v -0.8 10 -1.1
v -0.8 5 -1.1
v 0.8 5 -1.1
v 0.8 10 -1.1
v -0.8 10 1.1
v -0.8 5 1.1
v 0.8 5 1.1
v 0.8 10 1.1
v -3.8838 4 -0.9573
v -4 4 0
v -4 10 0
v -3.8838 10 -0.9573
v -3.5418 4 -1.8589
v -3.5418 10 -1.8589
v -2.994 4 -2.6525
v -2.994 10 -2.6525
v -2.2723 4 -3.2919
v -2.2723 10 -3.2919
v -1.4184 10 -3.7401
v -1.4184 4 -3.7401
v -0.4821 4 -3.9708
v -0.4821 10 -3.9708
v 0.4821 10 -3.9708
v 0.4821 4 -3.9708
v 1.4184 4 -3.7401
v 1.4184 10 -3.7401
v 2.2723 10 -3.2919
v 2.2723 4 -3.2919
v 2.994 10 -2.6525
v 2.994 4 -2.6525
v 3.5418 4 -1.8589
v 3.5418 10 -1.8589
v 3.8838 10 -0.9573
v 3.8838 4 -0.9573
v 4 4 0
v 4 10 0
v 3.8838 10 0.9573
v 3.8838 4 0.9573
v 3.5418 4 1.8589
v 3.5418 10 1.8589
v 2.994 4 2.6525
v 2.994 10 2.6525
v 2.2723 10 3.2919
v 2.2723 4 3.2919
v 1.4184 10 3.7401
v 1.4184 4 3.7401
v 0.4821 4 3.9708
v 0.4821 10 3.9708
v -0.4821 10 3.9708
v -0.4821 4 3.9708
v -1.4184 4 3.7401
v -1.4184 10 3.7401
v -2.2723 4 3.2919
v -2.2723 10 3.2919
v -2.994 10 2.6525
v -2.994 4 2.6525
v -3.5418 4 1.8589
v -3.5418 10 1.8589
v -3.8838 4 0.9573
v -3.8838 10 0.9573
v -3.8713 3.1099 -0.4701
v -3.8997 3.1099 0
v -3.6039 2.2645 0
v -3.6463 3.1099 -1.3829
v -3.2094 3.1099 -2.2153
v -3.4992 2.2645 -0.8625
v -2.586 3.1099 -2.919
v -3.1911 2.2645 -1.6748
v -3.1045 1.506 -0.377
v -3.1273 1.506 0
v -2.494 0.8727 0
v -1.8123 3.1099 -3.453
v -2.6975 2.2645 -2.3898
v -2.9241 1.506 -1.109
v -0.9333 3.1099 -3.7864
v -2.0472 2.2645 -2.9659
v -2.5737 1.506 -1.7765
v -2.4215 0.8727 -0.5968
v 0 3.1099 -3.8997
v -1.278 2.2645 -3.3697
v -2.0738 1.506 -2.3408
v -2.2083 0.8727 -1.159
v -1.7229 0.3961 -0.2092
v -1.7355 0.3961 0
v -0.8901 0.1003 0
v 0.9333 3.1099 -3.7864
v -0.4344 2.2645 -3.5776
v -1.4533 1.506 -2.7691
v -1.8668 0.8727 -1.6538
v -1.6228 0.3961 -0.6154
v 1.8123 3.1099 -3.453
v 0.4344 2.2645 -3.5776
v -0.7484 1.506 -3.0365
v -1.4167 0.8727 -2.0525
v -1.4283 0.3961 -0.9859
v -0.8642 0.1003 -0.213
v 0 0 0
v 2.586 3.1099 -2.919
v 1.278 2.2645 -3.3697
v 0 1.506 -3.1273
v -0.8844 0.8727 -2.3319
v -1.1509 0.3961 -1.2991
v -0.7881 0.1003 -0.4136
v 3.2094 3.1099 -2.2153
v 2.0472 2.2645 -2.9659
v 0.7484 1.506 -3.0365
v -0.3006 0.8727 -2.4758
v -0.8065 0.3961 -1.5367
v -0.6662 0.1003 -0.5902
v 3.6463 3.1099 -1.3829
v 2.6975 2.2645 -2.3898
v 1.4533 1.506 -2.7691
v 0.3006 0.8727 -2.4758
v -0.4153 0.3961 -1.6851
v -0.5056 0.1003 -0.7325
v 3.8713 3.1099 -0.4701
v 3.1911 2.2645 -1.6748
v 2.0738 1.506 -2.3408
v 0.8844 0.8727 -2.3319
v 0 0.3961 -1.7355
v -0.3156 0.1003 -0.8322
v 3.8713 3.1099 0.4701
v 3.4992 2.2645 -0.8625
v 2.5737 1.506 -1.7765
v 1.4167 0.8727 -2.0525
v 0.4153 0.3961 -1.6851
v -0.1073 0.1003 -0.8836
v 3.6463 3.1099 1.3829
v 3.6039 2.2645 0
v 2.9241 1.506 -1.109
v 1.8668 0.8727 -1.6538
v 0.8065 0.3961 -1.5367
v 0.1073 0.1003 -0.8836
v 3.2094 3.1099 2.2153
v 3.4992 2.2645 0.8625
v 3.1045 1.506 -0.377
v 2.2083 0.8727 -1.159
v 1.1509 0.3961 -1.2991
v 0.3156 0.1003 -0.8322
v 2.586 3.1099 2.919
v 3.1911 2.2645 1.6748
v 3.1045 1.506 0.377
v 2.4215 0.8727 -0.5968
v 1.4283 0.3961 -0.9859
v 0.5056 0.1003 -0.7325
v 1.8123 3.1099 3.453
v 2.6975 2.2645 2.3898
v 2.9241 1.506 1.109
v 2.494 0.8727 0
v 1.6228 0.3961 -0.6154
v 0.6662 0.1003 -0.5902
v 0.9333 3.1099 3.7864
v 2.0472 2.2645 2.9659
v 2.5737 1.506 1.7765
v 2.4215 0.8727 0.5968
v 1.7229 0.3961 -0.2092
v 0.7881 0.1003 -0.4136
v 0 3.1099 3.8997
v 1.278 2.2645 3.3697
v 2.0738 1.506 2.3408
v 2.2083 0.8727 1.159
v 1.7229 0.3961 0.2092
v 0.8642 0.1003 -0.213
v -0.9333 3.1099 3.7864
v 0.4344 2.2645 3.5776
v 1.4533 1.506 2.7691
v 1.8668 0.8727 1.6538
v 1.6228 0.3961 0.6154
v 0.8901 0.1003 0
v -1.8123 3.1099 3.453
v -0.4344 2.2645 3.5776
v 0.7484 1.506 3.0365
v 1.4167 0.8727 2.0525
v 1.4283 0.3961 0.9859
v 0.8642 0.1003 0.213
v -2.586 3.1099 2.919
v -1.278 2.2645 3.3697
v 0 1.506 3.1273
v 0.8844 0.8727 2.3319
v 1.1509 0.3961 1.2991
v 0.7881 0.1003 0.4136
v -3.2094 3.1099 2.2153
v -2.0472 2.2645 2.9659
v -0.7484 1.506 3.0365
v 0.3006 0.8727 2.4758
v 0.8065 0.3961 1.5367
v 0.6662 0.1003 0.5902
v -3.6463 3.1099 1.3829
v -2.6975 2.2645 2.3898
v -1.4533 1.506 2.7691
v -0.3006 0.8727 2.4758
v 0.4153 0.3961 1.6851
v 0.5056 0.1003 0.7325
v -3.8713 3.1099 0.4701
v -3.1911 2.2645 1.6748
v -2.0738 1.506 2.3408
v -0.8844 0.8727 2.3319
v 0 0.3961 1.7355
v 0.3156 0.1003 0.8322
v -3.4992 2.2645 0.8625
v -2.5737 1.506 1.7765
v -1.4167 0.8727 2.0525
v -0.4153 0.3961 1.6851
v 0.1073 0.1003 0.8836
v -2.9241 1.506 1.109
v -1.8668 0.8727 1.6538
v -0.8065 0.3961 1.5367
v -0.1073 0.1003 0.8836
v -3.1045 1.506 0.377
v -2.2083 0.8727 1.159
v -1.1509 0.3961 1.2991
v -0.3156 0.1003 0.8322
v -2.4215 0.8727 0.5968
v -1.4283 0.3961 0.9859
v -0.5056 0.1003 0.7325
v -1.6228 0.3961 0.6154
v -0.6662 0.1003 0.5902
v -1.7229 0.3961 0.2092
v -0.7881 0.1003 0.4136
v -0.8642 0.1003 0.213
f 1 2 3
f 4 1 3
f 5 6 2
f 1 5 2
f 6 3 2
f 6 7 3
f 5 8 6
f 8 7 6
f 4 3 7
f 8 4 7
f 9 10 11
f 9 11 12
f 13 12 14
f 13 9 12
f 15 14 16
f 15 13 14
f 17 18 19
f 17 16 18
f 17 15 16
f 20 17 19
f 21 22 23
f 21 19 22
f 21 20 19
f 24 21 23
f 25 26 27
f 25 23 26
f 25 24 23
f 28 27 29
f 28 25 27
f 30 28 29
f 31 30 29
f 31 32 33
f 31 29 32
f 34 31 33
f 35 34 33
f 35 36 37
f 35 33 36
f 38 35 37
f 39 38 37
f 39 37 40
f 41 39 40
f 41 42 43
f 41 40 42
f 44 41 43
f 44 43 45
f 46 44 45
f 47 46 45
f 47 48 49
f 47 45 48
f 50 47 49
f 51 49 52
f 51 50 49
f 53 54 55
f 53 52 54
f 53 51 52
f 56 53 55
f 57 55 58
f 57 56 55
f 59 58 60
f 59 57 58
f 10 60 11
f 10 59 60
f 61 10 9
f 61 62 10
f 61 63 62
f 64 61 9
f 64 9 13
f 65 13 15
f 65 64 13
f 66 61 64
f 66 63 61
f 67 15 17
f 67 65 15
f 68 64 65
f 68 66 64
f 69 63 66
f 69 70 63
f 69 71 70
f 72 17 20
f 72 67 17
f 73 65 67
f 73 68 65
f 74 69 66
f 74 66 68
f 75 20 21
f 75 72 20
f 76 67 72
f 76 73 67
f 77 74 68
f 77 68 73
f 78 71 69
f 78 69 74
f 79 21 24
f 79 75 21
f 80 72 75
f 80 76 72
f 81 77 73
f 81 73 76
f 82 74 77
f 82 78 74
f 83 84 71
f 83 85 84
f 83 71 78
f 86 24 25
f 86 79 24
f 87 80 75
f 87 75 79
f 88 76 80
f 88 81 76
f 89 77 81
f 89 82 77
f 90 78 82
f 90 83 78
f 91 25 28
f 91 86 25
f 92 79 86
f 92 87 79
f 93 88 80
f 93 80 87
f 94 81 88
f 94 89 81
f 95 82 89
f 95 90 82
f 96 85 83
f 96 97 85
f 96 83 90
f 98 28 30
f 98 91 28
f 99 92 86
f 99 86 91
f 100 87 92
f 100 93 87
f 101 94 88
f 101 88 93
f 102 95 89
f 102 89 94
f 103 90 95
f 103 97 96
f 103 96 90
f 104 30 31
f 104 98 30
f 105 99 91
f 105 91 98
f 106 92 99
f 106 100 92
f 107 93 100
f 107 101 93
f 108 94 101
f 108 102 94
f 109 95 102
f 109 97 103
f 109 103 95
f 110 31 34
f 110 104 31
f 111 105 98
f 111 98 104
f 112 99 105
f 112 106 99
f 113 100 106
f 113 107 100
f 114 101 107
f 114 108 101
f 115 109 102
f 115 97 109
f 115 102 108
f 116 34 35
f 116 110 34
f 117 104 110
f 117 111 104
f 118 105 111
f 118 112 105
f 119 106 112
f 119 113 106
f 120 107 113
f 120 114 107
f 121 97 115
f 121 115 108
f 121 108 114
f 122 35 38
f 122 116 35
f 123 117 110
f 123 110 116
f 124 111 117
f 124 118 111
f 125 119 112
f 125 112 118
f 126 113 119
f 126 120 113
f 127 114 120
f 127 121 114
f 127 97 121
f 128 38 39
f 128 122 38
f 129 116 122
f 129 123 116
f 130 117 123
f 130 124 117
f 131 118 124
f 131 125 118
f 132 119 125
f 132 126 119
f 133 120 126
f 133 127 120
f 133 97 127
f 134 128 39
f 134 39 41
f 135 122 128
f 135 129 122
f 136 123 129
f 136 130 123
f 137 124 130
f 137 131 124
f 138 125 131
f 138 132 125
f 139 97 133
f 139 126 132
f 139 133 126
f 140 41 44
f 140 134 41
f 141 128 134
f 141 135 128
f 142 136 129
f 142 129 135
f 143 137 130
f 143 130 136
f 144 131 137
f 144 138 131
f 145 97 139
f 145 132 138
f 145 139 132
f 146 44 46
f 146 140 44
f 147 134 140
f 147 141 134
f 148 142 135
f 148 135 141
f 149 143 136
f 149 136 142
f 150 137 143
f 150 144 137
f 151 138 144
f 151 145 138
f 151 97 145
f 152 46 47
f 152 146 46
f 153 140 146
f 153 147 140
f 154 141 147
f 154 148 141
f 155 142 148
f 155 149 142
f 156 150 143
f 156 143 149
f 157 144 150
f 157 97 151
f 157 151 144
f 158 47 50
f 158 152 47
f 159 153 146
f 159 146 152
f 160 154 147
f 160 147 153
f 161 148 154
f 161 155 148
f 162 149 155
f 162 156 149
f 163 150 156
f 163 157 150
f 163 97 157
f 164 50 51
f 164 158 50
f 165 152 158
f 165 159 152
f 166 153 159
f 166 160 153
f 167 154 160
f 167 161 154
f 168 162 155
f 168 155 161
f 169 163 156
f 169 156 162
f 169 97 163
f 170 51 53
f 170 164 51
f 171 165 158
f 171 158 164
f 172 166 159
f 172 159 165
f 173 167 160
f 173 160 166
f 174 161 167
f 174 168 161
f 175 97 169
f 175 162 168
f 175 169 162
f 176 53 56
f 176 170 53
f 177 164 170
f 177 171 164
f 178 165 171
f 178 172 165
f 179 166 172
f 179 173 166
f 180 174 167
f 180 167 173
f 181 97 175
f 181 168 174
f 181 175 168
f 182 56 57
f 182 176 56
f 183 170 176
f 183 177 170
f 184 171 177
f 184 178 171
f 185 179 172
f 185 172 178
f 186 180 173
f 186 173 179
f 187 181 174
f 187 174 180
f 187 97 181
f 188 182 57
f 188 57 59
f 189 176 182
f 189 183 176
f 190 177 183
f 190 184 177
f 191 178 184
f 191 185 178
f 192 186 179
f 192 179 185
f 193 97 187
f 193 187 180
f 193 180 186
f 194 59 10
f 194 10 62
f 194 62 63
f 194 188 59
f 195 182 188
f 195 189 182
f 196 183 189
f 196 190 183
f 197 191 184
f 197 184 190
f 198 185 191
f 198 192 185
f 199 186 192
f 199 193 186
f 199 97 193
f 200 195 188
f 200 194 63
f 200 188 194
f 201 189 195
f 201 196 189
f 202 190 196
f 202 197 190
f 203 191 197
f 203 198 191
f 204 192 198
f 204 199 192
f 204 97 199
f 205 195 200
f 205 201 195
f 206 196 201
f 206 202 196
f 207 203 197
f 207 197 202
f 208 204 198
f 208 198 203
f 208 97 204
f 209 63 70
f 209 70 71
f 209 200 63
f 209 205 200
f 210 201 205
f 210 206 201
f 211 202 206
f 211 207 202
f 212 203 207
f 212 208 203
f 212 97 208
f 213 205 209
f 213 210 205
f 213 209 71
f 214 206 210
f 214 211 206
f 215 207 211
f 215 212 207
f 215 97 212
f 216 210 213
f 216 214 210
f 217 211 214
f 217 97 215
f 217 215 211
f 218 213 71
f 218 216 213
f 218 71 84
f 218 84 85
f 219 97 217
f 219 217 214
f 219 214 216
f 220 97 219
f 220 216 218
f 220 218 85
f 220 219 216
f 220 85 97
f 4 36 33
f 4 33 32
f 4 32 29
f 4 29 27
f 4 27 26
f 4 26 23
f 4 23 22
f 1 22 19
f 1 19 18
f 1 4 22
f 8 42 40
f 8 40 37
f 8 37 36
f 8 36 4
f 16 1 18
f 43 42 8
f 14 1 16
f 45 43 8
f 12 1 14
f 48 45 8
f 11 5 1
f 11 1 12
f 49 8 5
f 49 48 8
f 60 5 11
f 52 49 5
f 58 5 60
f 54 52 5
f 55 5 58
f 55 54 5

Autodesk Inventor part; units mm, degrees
ref_plane "YZ Plane" through (0, 0, 0) normal (1, 0, 0) x (0, 1, 0)
ref_plane "XZ Plane" through (0, 0, 0) normal (0, 1, 0) x (-1, 0, 0)
ref_plane "XY Plane" through (0, 0, 0) normal (0, 0, 1) x (1, 0, 0)
sketch "Sketch1" plane through (0, 0, 0) normal (0, 1, 0) x (-1, 0, 0)
  line L0 (-0.8, 1.1) -> (0.8, 1.1)
  line L1 (0.8, 1.1) -> (0.8, -1.1)
  line L2 (0.8, -1.1) -> (-0.8, -1.1)
  line L3 (-0.8, -1.1) -> (-0.8, 1.1)
  line L4 (-0.8, 1.1) -> (0.8, -1.1) construction
  line L5 (0.8, 1.1) -> (-0.8, -1.1) construction
  circle A0 centre (0, 0) radius 4
  dimension "d0" = 1.6
  dimension "d1" = 2.2
  dimension "d2" = 8
extrude "Extrusion1" add sketch "Sketch1" along normal blind 10
extrude "Extrusion2" add sketch "Sketch1" along normal blind 5 contours L0 L1 L2 L3
fillet "Fillet1" radius 4 1 edges at (4, 0, 0)
properties part number "Joy"
